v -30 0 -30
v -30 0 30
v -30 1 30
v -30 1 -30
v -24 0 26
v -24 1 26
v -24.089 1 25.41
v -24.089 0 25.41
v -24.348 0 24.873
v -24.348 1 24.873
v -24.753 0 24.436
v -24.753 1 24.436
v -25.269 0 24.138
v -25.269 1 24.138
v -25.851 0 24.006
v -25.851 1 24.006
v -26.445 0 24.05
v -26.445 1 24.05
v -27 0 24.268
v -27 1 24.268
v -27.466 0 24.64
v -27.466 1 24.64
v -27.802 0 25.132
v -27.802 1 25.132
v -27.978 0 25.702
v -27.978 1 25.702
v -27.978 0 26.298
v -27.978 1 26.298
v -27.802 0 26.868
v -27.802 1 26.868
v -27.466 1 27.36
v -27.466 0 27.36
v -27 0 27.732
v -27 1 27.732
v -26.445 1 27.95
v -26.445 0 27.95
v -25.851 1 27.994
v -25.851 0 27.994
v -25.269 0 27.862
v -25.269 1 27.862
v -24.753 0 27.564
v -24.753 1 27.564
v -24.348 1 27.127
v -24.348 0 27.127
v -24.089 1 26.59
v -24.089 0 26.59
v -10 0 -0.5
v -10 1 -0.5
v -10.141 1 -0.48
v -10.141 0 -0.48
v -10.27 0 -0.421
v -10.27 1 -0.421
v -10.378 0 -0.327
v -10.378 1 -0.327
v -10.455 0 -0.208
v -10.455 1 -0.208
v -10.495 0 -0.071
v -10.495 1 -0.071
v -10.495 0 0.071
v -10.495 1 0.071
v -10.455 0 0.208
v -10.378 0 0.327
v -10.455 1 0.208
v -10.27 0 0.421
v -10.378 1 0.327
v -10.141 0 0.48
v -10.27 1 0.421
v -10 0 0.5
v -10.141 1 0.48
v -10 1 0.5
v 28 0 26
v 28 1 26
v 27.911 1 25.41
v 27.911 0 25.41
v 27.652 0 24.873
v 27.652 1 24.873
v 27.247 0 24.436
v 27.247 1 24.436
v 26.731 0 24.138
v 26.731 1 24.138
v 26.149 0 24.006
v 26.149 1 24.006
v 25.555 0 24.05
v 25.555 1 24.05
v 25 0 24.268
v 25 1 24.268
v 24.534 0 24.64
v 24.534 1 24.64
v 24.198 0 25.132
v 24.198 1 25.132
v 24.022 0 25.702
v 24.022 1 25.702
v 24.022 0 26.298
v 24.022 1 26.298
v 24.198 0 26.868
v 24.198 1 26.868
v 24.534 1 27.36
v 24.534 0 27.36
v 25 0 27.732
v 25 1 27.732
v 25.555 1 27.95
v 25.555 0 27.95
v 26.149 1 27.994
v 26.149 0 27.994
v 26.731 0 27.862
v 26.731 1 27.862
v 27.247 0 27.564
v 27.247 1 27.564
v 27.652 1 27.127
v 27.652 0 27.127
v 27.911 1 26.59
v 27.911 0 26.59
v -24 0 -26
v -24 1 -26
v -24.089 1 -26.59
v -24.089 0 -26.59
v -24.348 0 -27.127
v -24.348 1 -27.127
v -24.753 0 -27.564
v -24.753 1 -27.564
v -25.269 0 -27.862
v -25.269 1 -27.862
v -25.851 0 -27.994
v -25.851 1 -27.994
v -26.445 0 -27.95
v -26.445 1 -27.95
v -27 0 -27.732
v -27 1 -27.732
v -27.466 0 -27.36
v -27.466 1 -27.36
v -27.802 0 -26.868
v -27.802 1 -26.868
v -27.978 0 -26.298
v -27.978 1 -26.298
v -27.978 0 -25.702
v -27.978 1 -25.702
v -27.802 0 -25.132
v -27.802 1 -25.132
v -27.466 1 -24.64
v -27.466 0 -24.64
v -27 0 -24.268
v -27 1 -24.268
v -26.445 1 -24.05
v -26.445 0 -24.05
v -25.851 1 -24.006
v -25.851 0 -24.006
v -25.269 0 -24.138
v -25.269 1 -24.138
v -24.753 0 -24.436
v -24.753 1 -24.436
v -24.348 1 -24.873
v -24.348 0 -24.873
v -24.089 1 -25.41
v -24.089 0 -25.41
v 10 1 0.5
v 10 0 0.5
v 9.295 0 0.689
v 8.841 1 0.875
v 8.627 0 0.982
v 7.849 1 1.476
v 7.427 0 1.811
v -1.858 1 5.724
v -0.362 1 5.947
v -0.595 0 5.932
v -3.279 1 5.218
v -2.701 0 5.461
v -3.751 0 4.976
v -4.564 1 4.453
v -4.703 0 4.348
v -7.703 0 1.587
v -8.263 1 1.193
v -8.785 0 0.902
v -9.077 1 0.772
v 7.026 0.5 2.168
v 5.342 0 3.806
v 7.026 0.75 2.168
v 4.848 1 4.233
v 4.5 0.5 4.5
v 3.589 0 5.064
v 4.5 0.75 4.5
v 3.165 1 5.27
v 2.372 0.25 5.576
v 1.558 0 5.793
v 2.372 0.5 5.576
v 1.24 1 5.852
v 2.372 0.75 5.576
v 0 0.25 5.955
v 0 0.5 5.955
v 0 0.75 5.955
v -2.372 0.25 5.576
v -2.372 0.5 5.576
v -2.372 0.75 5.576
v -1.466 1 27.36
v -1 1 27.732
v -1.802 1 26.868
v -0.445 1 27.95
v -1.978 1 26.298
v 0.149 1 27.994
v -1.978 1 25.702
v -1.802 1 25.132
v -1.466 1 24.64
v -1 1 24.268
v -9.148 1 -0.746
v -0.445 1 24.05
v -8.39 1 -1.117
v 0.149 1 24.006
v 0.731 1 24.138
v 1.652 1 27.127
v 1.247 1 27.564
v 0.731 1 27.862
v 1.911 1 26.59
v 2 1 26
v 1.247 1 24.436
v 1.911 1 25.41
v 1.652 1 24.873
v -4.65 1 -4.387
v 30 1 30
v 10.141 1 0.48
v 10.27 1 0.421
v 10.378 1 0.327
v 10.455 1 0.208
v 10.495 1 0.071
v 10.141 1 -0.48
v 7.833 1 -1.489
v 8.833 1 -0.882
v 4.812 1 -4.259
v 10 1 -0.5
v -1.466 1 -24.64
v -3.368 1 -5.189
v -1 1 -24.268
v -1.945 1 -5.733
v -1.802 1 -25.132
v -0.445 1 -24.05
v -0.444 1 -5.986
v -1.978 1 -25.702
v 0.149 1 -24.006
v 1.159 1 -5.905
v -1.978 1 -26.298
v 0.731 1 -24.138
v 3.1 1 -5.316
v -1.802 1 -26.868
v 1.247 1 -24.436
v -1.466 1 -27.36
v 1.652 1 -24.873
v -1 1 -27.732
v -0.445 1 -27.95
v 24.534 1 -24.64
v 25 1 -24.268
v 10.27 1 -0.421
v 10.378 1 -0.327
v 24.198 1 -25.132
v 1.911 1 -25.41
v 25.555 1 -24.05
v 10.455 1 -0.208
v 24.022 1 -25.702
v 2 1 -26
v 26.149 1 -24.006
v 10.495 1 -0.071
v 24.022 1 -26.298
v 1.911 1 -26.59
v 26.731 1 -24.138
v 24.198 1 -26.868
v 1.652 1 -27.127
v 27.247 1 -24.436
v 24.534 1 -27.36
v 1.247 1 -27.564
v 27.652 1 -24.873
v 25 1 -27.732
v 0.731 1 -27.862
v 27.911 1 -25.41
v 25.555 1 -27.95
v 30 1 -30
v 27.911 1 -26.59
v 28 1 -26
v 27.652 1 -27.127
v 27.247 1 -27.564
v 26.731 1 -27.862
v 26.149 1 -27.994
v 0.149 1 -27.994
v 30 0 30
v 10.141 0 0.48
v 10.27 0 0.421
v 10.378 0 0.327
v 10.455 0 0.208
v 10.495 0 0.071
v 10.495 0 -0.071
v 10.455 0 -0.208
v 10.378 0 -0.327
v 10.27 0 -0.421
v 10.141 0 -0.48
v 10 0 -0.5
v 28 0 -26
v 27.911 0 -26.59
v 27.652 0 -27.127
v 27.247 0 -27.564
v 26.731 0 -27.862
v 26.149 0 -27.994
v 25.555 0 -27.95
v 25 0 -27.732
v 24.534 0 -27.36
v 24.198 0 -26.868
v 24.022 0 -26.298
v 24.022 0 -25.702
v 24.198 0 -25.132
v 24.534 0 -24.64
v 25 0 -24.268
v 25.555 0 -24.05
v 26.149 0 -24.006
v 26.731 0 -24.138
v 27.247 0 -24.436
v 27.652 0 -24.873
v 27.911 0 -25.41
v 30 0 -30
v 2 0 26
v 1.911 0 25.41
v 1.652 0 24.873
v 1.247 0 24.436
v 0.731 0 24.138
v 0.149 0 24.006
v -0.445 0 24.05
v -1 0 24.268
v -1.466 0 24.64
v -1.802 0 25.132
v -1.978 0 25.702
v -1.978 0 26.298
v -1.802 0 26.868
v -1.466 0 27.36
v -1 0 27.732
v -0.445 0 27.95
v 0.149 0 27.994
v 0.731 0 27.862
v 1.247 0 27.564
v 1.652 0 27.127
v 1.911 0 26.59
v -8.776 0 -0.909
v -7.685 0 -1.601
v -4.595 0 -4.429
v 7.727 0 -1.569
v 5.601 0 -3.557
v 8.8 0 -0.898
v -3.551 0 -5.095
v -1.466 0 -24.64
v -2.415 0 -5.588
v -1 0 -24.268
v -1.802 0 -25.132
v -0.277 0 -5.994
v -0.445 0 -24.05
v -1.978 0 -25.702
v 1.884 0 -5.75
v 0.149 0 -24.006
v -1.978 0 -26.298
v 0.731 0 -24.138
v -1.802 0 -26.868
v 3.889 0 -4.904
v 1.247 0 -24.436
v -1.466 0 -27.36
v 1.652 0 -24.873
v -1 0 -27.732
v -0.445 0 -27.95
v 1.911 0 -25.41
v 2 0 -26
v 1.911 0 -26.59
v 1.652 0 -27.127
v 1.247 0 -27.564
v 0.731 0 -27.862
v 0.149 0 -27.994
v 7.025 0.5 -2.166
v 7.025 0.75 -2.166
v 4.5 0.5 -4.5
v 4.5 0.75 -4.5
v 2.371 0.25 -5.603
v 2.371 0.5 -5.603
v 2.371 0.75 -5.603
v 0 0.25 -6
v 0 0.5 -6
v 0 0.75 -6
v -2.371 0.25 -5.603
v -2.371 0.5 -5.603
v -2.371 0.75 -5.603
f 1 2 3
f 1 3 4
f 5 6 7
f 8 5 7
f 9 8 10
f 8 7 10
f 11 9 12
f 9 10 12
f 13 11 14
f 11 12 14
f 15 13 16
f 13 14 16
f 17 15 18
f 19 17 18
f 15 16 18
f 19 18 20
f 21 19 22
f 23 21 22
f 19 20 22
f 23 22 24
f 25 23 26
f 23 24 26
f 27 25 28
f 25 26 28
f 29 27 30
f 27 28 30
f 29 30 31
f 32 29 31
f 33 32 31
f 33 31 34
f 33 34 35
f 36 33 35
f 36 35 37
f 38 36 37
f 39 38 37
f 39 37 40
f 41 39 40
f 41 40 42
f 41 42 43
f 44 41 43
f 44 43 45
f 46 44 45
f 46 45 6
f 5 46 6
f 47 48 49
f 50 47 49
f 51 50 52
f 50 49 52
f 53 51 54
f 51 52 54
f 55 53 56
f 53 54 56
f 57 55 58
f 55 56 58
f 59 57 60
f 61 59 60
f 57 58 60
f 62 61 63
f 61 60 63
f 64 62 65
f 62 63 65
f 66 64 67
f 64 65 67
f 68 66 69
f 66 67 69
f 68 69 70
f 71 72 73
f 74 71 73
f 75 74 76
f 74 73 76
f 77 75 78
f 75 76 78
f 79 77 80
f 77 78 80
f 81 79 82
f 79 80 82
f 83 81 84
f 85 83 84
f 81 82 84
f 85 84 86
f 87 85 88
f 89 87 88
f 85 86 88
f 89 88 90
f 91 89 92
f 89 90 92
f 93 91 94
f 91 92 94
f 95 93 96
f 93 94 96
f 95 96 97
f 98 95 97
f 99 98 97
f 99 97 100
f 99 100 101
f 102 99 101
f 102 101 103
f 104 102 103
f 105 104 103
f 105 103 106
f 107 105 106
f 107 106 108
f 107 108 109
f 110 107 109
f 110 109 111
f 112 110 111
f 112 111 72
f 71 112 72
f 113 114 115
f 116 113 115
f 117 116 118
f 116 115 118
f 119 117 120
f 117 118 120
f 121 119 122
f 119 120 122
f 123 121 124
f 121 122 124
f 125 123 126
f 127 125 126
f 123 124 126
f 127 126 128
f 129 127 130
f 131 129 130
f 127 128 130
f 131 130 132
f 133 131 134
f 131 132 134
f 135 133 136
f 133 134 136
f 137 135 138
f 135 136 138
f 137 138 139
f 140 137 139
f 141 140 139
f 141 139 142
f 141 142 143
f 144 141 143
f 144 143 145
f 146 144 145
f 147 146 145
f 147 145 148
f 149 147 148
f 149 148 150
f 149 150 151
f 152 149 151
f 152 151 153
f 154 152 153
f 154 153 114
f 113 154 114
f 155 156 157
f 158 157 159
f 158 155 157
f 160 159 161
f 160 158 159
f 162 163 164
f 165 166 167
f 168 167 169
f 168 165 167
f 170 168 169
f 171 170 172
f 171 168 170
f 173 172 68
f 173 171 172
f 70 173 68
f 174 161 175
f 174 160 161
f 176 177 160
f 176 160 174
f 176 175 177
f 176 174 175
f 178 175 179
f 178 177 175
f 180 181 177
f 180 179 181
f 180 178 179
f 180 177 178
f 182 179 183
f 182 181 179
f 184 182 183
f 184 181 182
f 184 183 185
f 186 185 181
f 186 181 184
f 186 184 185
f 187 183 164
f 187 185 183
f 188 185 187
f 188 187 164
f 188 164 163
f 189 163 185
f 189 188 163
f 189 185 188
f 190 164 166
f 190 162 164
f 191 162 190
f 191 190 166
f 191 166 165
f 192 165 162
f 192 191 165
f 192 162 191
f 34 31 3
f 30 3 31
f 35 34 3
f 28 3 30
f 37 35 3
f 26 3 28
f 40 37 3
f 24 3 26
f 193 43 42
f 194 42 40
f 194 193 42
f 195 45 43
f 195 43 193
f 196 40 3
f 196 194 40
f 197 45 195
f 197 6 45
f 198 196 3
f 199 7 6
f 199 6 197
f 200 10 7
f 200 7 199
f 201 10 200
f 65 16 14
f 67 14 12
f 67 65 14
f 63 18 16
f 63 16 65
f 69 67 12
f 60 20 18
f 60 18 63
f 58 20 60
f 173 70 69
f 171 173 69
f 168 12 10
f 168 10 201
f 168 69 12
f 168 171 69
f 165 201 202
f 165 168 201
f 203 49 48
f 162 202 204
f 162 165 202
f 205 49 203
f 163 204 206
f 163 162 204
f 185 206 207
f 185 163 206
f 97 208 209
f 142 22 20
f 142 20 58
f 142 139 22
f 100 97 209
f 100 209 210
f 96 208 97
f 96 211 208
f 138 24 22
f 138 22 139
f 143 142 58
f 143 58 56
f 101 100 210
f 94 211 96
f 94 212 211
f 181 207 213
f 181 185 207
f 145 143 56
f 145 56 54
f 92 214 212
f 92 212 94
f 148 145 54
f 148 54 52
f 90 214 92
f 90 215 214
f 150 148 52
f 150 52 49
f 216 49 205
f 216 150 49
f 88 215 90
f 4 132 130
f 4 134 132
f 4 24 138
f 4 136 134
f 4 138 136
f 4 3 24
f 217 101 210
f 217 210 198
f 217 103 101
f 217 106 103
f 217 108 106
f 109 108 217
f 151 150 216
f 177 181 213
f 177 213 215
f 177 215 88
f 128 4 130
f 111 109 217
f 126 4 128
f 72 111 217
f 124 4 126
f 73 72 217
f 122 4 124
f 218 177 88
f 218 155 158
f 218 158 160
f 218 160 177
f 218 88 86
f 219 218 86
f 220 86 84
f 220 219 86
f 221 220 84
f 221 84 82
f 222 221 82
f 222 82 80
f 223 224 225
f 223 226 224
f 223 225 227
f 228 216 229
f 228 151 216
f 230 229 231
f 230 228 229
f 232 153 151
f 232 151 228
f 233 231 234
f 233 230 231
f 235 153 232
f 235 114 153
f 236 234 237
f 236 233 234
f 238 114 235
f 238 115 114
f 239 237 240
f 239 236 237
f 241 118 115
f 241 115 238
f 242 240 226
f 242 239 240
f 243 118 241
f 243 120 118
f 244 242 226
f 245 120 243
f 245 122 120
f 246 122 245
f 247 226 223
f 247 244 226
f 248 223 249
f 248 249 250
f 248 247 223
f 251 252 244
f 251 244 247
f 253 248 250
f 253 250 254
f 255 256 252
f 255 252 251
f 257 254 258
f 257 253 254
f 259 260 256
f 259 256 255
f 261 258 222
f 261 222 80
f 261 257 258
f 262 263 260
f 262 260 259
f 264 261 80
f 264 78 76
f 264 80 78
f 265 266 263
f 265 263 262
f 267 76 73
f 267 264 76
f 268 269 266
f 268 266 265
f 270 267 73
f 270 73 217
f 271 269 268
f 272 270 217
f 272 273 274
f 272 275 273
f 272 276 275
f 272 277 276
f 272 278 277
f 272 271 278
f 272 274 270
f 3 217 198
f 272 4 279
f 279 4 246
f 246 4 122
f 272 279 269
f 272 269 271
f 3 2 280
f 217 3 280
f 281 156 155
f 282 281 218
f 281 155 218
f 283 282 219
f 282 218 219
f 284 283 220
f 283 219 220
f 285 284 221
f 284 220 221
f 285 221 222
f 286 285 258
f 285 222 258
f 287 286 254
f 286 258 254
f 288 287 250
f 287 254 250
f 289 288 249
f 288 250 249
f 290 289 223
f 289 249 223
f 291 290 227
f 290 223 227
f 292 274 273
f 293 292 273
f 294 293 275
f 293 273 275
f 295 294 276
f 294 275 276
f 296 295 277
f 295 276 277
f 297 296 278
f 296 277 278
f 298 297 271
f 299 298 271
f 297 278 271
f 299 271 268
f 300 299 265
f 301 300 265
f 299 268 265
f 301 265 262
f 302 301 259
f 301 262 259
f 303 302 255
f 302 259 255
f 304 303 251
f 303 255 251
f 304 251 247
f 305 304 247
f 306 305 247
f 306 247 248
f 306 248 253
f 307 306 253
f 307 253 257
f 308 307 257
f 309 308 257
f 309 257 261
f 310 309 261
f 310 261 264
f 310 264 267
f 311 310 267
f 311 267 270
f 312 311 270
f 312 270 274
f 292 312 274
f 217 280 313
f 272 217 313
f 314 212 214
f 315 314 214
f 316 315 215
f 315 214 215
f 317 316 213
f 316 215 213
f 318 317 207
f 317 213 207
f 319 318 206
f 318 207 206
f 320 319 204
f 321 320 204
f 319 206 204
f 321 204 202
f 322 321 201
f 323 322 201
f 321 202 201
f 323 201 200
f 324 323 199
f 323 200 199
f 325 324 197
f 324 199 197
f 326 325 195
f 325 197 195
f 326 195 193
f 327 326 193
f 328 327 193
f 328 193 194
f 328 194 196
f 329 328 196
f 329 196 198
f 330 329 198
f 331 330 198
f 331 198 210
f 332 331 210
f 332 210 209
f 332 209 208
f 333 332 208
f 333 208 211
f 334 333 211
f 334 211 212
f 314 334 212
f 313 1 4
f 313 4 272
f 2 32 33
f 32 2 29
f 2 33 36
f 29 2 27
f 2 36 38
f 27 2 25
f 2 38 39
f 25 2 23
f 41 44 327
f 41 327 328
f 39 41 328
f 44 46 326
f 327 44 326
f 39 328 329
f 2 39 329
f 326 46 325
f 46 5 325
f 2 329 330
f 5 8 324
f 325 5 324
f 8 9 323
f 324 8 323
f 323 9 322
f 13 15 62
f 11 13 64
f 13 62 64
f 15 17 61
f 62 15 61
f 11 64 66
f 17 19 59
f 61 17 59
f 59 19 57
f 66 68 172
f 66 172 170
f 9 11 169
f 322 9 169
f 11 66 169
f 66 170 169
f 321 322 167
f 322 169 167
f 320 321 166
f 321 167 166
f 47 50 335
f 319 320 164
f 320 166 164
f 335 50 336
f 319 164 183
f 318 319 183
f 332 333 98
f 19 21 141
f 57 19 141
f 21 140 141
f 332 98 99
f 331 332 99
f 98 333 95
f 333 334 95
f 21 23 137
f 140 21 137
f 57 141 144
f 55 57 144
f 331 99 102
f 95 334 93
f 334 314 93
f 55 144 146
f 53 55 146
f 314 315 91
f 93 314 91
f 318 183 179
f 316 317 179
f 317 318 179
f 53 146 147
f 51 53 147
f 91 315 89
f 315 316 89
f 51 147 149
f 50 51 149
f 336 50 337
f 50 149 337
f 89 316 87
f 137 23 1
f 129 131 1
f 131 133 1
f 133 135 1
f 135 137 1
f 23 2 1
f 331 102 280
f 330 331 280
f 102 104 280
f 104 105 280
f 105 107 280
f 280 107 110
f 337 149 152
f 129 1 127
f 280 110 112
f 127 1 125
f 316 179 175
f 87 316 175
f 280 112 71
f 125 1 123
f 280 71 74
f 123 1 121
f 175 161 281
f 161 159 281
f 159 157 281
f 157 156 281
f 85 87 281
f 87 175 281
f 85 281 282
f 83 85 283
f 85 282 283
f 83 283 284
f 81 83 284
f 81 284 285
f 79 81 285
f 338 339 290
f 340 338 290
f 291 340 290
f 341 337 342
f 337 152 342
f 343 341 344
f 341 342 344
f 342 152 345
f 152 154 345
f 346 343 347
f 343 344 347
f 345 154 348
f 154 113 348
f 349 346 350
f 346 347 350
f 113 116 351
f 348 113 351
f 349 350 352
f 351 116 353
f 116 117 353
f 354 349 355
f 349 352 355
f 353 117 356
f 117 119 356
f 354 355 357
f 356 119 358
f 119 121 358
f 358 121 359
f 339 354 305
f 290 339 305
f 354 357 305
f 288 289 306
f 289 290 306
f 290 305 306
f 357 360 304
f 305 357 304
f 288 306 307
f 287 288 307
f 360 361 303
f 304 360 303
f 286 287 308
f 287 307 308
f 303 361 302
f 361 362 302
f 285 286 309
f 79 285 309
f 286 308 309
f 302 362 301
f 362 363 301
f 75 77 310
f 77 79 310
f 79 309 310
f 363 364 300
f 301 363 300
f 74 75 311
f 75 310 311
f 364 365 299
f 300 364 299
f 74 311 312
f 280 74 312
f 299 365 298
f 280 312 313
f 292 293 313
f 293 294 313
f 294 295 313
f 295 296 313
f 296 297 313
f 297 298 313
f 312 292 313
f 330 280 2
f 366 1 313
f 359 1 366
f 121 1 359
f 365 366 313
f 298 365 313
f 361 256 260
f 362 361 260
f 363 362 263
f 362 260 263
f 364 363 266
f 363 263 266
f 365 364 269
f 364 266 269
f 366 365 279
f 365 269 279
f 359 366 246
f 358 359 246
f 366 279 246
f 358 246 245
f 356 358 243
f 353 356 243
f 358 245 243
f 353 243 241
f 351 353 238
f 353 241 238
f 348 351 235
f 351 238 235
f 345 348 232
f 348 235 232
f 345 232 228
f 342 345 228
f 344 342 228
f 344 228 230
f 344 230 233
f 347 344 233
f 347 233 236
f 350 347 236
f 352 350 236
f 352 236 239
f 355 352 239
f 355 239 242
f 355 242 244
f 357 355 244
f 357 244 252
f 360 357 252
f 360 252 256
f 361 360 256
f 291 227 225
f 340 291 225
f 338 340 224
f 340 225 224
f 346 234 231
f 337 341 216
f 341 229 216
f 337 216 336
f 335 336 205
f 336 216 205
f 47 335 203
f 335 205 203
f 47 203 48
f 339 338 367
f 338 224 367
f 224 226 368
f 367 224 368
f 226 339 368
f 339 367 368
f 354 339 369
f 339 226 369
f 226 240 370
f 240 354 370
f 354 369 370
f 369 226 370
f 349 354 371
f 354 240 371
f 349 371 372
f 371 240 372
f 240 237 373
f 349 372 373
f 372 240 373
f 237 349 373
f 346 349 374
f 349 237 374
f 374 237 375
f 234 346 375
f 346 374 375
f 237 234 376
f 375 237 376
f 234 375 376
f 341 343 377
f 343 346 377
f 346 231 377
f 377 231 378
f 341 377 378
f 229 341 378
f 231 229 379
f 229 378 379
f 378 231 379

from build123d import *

# Parameters (mm, degrees)
SKETCH1_W           = 60
SKETCH1_H           = 60
BOSS_EXTRUDE1_DEPTH = 1
SKETCH2_R           = 2
CUT_EXTRUDE1_DEPTH  = 2
SKETCH3_R           = 0.5
CUT_EXTRUDE2_DEPTH  = 2
CUT_EXTRUDE3_DEPTH  = 10


with BuildPart() as part:
    # Sketch1 → Boss-Extrude1 (new body)
    with BuildSketch(Plane(origin=(0, 0, 0), x_dir=(1, 0, 0), z_dir=(0, 1, 0))):
        Rectangle(SKETCH1_W, SKETCH1_H)
    extrude(amount=BOSS_EXTRUDE1_DEPTH)

    # Sketch2 → Cut-Extrude1 (cut, through all)
    with BuildSketch(Plane(origin=(0, 1, 0), x_dir=(1, 0, 0), z_dir=(0, 1, 0))):
        with Locations((-26, 26)):
            Circle(SKETCH2_R)
        with Locations((0, 26)):
            Circle(SKETCH2_R)
        with Locations((26, 26)):
            Circle(SKETCH2_R)
        with Locations((26, -26)):
            Circle(SKETCH2_R)
        with Locations((0, -26)):
            Circle(SKETCH2_R)
        with Locations((-26, -26)):
            Circle(SKETCH2_R)
    extrude(amount=-CUT_EXTRUDE1_DEPTH, mode=Mode.SUBTRACT)

    # Sketch3 → Cut-Extrude2 (cut, through all)
    with BuildSketch(Plane(origin=(0, 1, 0), x_dir=(1, 0, 0), z_dir=(0, 1, 0))):
        with Locations((10, 0)):
            Circle(SKETCH3_R)
        with Locations((-10, 0)):
            Circle(SKETCH3_R)
    extrude(amount=-CUT_EXTRUDE2_DEPTH, mode=Mode.SUBTRACT)

    # Sketch7 → Cut-Extrude3 (cut)
    with BuildSketch(Plane(origin=(0, 1, 0), x_dir=(1, 0, 0), z_dir=(0, 1, 0))):
        with BuildLine():
            add(Edge.make_bspline(
                [(10, 0.5), (7.54185609, 0.971550622), (5.54199885, 4.633621193), (0, 6.558338078), (-5.54199885, 4.633621193), (-7.54185609, 0.971550622), (-10, 0.5)],
                knots=[0, 0, 0, 0, 0.295686937, 0.5, 0.704313063, 1, 1, 1, 1], degree=3))
            add(Edge.make_bspline(
                [(-10, 0.5), (-11, 0), (-10, -0.5)],
                knots=[0, 0, 0, 1, 1, 1], degree=2))
            add(Edge.make_bspline(
                [(10, -0.5), (7.539614158, -0.960866701), (5.551451154, -4.662870645), (0, -6.482717161), (-5.551451154, -4.662870645), (-7.539614158, -0.960866701), (-10, -0.5)],
                knots=[0, 0, 0, 0, 0.296041393, 0.5, 0.703958607, 1, 1, 1, 1], degree=3))
            add(Edge.make_bspline(
                [(10, 0.5), (11, 0), (10, -0.5)],
                knots=[0, 0, 0, 1, 1, 1], degree=2))
        make_face()
    extrude(amount=-CUT_EXTRUDE3_DEPTH, mode=Mode.SUBTRACT)


solid = part.part
